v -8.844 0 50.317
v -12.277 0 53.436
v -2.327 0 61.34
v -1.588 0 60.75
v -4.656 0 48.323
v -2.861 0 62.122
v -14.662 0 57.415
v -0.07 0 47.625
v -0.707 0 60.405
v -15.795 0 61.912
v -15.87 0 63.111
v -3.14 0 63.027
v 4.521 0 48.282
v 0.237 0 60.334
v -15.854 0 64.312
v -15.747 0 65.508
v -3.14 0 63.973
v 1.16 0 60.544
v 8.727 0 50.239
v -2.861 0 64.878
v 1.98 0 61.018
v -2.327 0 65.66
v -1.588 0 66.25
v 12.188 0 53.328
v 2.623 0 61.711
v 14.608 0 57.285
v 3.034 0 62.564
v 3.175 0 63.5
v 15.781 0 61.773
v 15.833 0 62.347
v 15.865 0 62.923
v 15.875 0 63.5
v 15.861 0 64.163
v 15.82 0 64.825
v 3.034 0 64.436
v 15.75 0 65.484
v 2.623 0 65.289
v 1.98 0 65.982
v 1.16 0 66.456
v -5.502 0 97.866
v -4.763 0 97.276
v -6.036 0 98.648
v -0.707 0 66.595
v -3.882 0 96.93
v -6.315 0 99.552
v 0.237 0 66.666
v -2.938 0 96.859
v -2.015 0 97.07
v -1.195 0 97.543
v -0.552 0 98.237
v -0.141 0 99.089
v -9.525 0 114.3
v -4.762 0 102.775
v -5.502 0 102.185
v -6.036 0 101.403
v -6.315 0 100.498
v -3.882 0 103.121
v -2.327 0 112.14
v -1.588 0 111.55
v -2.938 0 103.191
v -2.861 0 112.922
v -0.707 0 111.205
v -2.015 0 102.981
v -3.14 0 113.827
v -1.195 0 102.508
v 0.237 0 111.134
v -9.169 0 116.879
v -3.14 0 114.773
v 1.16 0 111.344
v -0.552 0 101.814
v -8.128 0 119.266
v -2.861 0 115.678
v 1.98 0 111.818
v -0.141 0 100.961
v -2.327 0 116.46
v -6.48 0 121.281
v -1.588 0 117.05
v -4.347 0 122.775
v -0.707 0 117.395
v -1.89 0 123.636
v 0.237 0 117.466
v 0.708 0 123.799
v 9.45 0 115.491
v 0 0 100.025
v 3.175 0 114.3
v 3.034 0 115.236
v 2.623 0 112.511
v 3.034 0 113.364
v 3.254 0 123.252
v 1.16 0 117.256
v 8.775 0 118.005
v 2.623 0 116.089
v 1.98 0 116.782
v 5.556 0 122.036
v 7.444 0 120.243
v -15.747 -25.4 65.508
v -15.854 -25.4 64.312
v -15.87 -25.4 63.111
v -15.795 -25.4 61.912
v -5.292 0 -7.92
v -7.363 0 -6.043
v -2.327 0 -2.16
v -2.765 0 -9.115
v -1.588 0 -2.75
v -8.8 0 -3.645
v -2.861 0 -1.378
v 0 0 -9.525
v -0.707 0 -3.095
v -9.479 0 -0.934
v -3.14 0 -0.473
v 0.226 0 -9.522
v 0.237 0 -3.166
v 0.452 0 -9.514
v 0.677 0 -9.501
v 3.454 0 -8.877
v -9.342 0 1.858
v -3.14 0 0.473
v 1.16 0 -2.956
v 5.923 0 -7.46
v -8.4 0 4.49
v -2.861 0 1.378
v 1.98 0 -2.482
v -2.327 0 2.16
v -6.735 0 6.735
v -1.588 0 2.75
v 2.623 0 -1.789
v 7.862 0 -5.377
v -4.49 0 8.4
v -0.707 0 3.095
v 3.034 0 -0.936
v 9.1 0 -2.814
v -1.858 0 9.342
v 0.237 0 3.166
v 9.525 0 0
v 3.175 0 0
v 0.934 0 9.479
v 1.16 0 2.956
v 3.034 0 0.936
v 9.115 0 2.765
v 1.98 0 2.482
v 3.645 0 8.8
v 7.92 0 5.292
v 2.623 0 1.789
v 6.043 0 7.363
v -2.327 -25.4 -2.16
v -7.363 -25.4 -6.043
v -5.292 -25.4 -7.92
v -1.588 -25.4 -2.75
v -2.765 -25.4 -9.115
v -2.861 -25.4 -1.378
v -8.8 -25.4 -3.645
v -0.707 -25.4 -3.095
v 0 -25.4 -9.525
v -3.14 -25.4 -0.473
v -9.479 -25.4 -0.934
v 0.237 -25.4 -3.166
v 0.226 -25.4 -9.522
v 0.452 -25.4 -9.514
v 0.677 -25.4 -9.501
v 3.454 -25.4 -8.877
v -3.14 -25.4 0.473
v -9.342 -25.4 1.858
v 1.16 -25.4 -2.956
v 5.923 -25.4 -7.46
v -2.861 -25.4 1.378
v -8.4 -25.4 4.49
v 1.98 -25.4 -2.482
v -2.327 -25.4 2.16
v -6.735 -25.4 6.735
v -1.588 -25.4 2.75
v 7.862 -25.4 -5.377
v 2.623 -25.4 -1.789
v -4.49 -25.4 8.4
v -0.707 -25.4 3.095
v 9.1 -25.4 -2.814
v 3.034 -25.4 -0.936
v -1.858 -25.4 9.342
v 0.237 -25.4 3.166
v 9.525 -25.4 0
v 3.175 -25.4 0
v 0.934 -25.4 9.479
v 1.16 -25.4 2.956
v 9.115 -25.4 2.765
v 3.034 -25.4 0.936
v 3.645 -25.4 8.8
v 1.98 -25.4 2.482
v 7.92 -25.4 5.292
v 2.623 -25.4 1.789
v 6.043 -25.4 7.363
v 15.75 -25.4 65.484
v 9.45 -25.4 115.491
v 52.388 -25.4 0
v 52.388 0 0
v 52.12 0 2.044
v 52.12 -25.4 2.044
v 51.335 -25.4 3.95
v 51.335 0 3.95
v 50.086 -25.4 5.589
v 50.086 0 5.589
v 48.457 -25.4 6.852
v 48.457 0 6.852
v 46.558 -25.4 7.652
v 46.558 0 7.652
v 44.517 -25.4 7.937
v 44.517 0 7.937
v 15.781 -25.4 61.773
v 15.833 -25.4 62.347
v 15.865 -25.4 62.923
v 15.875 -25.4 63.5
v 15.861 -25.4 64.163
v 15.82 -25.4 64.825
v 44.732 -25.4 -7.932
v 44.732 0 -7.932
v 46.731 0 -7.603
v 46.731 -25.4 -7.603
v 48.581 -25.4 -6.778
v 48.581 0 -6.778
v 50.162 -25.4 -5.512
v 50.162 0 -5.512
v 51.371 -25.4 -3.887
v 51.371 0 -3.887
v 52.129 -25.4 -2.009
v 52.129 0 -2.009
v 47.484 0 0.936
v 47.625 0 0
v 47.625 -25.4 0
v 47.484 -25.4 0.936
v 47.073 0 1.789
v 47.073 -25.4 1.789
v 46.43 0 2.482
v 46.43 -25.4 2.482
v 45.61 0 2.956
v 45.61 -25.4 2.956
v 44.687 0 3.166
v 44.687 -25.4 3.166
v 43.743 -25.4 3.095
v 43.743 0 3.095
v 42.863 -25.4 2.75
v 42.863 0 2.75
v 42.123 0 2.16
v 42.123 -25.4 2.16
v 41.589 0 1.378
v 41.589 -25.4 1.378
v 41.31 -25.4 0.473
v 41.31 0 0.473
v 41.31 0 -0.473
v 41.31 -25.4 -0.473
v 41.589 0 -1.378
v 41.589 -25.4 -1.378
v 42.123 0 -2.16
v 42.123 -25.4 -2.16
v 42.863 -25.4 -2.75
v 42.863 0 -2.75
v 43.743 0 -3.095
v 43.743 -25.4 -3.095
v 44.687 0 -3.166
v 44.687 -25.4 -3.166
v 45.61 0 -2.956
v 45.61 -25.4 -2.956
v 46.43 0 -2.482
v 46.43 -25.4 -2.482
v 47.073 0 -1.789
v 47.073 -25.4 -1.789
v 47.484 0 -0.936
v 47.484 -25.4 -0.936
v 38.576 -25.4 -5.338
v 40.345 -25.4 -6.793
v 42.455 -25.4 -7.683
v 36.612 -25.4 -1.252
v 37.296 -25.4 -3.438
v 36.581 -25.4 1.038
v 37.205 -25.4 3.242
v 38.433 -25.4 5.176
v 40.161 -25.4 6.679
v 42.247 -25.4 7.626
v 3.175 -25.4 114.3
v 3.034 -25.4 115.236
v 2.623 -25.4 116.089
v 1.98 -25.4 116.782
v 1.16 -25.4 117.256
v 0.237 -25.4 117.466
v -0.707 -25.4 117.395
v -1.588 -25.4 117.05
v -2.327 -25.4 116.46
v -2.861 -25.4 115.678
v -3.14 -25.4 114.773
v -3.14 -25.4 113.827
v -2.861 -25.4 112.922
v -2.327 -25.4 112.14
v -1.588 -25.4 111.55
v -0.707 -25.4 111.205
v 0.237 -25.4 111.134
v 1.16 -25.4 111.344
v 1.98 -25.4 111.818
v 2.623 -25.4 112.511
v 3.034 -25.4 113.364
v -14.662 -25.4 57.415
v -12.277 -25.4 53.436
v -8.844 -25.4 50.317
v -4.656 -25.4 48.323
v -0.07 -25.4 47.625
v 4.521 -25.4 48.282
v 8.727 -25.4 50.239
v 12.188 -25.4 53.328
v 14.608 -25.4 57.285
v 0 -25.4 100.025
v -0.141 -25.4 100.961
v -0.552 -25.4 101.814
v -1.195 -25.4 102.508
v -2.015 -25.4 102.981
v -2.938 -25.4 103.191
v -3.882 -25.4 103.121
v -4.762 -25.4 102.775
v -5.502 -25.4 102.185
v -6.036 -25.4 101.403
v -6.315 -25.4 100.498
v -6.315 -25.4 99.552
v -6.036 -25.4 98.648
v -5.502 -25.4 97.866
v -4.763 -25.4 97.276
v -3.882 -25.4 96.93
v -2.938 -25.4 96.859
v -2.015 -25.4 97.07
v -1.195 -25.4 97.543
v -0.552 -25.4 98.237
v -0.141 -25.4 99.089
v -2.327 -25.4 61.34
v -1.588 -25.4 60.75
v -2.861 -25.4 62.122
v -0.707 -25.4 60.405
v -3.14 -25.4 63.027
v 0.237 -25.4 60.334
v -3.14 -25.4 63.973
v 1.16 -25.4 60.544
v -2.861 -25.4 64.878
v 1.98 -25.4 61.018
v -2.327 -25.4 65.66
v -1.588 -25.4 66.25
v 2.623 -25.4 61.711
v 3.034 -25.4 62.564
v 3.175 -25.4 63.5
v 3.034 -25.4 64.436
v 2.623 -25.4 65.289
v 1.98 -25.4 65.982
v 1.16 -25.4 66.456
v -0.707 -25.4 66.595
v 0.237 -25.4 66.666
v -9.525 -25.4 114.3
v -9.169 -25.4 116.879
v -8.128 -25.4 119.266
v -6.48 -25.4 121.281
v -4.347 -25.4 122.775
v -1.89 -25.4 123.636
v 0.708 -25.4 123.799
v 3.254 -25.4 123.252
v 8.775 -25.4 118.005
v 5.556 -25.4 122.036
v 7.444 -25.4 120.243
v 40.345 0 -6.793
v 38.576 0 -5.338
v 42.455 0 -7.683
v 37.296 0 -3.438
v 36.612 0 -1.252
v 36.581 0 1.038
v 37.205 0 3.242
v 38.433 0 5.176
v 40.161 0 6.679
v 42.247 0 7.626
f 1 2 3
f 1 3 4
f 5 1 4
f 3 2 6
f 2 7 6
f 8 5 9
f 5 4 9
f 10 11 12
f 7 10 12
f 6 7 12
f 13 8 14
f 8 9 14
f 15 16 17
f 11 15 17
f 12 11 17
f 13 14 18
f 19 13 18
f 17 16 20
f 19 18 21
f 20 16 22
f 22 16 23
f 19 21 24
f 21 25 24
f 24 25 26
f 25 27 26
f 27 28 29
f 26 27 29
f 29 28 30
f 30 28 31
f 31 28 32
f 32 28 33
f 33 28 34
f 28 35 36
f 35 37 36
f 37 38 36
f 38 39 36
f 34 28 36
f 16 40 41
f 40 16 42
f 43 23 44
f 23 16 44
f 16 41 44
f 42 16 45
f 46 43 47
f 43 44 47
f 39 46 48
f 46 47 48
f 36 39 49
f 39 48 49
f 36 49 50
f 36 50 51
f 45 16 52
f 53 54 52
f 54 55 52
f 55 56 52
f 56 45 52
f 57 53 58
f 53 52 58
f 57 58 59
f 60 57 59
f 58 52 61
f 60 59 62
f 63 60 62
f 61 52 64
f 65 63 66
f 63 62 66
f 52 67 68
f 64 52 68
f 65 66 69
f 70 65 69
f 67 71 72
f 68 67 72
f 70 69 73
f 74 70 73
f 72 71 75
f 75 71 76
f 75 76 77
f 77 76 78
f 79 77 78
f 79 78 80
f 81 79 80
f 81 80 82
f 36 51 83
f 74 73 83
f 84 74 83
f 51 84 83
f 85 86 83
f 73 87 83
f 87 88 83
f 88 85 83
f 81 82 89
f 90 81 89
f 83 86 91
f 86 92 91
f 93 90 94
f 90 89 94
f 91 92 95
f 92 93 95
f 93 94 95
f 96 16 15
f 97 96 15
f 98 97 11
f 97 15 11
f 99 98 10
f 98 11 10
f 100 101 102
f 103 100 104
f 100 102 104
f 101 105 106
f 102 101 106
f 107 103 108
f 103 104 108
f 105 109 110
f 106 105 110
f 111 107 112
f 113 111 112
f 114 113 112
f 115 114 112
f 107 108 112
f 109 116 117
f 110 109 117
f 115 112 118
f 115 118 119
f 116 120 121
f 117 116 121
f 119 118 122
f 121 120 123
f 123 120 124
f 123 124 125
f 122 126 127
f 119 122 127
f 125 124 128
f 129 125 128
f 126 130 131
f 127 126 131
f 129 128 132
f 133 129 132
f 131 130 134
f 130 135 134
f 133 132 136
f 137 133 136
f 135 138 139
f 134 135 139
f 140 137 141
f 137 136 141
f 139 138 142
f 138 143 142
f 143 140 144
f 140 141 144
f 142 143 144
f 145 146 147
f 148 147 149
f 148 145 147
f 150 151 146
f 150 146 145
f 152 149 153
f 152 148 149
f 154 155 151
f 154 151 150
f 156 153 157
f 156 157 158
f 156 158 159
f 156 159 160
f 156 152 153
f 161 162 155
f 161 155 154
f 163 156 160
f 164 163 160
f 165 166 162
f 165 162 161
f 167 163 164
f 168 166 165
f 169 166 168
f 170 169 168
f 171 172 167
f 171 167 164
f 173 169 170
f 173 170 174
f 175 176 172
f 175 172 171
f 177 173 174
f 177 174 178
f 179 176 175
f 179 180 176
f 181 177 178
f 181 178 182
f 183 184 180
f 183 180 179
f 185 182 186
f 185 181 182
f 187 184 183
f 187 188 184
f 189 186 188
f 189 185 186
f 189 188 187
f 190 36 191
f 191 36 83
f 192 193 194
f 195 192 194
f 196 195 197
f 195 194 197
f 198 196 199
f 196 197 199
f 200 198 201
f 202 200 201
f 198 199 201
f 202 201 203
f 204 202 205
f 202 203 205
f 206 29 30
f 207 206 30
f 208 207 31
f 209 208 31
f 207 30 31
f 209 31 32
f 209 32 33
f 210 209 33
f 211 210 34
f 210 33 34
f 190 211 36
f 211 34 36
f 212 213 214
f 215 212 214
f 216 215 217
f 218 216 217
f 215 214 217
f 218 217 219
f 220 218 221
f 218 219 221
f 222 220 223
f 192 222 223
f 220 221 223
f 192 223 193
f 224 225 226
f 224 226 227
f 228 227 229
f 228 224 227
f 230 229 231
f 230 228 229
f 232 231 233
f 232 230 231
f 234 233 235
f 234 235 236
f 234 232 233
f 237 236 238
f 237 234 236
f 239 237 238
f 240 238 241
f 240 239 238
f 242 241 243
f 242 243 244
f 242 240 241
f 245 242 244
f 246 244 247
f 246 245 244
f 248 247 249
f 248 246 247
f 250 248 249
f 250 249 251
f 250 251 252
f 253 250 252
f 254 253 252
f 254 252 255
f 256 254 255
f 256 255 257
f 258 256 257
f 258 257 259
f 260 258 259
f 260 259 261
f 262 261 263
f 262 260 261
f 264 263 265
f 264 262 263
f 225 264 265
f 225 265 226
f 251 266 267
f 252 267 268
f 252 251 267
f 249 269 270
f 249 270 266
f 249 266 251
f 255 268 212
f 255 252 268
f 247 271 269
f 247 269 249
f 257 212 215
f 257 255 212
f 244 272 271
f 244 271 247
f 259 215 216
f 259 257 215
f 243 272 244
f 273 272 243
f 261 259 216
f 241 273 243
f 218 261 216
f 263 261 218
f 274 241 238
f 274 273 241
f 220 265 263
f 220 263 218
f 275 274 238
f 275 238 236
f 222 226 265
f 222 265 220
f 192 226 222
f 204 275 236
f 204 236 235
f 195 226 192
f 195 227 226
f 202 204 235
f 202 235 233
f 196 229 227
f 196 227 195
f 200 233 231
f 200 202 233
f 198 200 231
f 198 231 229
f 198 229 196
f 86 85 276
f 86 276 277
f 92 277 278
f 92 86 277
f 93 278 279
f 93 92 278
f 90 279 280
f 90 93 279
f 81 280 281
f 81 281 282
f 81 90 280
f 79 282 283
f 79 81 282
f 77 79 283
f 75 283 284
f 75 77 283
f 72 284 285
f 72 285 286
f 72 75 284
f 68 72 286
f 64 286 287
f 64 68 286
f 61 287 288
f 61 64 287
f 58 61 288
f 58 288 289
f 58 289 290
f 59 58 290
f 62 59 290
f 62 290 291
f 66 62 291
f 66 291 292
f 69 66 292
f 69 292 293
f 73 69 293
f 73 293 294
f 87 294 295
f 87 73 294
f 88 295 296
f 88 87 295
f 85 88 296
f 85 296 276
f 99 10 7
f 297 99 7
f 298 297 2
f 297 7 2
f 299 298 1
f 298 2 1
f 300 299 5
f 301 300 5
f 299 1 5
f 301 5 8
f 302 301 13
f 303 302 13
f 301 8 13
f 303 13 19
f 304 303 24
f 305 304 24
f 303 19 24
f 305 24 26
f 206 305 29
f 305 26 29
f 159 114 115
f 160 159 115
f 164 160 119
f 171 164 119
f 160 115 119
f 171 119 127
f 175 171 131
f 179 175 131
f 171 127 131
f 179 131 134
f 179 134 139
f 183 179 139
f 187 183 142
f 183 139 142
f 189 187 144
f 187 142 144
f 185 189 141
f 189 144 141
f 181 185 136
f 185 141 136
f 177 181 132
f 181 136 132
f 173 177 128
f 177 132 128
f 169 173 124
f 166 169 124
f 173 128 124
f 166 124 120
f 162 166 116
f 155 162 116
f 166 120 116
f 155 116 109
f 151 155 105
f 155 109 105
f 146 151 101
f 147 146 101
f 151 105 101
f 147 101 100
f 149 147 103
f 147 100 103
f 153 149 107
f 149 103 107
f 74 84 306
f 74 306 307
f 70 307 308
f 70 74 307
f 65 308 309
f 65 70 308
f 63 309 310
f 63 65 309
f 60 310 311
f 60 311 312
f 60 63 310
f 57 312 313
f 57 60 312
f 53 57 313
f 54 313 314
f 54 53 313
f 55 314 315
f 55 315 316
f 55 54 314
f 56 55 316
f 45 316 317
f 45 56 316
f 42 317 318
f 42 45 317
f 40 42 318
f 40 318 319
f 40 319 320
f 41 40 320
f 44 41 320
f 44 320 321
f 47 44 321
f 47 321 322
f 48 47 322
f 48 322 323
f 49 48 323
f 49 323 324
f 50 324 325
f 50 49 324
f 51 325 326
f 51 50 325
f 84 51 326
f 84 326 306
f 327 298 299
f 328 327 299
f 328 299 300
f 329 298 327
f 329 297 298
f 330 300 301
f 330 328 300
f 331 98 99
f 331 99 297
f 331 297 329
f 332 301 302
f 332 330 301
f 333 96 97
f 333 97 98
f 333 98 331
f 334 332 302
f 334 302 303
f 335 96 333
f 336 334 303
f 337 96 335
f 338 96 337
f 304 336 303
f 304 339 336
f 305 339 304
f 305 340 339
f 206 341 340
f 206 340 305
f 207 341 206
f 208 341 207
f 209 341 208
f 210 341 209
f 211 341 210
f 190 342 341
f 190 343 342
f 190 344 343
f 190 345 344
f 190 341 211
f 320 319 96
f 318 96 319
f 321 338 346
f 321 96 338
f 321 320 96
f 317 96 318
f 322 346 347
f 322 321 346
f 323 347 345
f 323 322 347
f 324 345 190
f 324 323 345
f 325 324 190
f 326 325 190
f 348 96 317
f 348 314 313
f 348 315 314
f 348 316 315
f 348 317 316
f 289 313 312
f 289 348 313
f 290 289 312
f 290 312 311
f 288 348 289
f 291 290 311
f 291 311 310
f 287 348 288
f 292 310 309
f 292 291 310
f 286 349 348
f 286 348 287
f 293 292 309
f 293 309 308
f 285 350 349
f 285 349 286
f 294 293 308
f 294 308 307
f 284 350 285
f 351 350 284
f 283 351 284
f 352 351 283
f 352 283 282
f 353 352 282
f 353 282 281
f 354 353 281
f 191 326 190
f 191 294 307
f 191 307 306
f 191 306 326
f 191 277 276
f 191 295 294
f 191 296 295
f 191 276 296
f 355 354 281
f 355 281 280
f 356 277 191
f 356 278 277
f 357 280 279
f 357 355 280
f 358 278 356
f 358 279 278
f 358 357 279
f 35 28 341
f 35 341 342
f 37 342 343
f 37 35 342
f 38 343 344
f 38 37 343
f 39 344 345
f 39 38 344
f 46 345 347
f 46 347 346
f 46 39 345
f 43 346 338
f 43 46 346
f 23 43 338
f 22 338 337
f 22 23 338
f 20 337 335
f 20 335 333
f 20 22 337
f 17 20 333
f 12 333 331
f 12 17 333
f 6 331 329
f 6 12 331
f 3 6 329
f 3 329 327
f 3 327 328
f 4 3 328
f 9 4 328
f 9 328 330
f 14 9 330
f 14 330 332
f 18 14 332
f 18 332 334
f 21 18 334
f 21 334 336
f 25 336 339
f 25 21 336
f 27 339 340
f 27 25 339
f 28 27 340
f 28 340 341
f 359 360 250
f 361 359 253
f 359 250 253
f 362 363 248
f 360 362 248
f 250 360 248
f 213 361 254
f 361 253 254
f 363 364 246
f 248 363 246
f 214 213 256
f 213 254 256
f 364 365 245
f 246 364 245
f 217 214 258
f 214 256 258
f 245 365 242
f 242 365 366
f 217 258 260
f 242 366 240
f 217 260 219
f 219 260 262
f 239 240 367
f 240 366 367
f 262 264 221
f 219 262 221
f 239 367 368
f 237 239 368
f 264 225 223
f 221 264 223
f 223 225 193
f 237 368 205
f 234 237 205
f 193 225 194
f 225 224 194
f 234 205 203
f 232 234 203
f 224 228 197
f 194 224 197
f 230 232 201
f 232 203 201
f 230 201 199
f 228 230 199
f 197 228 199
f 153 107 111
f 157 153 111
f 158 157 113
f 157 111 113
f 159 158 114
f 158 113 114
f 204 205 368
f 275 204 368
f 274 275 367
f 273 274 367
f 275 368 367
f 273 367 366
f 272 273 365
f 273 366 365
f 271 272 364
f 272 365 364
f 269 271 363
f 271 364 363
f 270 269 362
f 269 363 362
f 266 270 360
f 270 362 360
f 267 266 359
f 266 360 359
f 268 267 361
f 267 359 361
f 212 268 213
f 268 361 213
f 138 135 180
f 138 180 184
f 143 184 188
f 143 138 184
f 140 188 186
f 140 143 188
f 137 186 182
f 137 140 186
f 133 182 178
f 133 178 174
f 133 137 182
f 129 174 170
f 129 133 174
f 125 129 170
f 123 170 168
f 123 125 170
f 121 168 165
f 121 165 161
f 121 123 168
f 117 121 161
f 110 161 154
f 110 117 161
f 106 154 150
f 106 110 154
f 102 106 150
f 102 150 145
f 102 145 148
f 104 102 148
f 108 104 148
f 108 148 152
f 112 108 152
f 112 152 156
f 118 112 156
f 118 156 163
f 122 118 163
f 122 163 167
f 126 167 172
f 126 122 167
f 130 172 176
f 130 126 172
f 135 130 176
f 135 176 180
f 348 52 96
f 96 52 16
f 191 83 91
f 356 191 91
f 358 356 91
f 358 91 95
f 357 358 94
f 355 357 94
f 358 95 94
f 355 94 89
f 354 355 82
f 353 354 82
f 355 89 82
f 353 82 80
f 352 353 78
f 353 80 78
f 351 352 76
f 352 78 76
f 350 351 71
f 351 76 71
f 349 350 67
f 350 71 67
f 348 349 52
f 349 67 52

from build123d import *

# Parameters (mm, degrees)
F0_R     = 3.175
F1_DEPTH = 25.4


with BuildPart() as f1:
    # F0 (on Front) → F1 (new body)
    with BuildSketch(Plane.XZ):
        with BuildLine():
            ThreePointArc((-9.525, 114.3), (0, 104.775), (9.525, 114.3))
            ThreePointArc((9.525, 114.3), (9.506305, 114.896483), (9.450293, 115.490625))
            ThreePointArc((9.450293, 115.490625), (-0.596483, 123.806305), (-9.525, 114.3))
        make_face()
        with Locations((0, 114.3)):
            Circle(F0_R, mode=Mode.SUBTRACT)
        with BuildLine():
            ThreePointArc((9.450293, 115.490625), (9.506305, 114.896483), (9.525, 114.3))
            ThreePointArc((9.525, 114.3), (0, 104.775), (-9.525, 114.3))
            Line((-9.525, 114.3), (-15.747457, 65.508289))
            ThreePointArc((-15.747457, 65.508289), (0.012053, 79.374995), (15.750488, 65.484375))
            Line((15.750488, 65.484375), (9.450293, 115.490625))
        make_face()
        with Locations((-3.175, 100.0252)):
            Circle(F0_R, mode=Mode.SUBTRACT)
        with BuildLine():
            ThreePointArc((0, -9.525), (0.338886, -9.51897), (0.677344, -9.500886))
            Line((0.677344, -9.500886), (0, -9.525))
        make_face()
        with BuildLine():
            Line((0, -9.525), (0.677344, -9.500886))
            ThreePointArc((0.677344, -9.500886), (6.970557, -6.491299), (9.525, 0))
            ThreePointArc((9.525, 0), (-6.735192, 6.735192), (0, -9.525))
        make_face()
        Circle(F0_R, mode=Mode.SUBTRACT)
        with BuildLine():
            ThreePointArc((52.3875, 0), (50.086158, 5.589063), (44.516601, 7.937221))
            ThreePointArc((44.516601, 7.937221), (36.513234, -0.107928), (44.732405, -7.932475))
            ThreePointArc((44.732405, -7.932475), (50.161633, -5.51191), (52.3875, 0))
        make_face()
        with Locations((44.45, 0)):
            Circle(F0_R, mode=Mode.SUBTRACT)
        with BuildLine():
            ThreePointArc((15.875, 63.5), (15.843841, 64.494139), (15.750488, 65.484375))
            ThreePointArc((15.750488, 65.484375), (0.012053, 79.374995), (-15.747457, 65.508289))
            ThreePointArc((-15.747457, 65.508289), (-15.873588, 63.711757), (-15.795426, 61.9125))
            ThreePointArc((-15.795426, 61.9125), (-0.070382, 47.625156), (15.780728, 61.772506))
            ThreePointArc((15.780728, 61.772506), (15.851415, 62.634968), (15.875, 63.5))
        make_face()
        with Locations((0, 63.5)):
            Circle(F0_R, mode=Mode.SUBTRACT)
    extrude(amount=F1_DEPTH)


solid = f1.part
